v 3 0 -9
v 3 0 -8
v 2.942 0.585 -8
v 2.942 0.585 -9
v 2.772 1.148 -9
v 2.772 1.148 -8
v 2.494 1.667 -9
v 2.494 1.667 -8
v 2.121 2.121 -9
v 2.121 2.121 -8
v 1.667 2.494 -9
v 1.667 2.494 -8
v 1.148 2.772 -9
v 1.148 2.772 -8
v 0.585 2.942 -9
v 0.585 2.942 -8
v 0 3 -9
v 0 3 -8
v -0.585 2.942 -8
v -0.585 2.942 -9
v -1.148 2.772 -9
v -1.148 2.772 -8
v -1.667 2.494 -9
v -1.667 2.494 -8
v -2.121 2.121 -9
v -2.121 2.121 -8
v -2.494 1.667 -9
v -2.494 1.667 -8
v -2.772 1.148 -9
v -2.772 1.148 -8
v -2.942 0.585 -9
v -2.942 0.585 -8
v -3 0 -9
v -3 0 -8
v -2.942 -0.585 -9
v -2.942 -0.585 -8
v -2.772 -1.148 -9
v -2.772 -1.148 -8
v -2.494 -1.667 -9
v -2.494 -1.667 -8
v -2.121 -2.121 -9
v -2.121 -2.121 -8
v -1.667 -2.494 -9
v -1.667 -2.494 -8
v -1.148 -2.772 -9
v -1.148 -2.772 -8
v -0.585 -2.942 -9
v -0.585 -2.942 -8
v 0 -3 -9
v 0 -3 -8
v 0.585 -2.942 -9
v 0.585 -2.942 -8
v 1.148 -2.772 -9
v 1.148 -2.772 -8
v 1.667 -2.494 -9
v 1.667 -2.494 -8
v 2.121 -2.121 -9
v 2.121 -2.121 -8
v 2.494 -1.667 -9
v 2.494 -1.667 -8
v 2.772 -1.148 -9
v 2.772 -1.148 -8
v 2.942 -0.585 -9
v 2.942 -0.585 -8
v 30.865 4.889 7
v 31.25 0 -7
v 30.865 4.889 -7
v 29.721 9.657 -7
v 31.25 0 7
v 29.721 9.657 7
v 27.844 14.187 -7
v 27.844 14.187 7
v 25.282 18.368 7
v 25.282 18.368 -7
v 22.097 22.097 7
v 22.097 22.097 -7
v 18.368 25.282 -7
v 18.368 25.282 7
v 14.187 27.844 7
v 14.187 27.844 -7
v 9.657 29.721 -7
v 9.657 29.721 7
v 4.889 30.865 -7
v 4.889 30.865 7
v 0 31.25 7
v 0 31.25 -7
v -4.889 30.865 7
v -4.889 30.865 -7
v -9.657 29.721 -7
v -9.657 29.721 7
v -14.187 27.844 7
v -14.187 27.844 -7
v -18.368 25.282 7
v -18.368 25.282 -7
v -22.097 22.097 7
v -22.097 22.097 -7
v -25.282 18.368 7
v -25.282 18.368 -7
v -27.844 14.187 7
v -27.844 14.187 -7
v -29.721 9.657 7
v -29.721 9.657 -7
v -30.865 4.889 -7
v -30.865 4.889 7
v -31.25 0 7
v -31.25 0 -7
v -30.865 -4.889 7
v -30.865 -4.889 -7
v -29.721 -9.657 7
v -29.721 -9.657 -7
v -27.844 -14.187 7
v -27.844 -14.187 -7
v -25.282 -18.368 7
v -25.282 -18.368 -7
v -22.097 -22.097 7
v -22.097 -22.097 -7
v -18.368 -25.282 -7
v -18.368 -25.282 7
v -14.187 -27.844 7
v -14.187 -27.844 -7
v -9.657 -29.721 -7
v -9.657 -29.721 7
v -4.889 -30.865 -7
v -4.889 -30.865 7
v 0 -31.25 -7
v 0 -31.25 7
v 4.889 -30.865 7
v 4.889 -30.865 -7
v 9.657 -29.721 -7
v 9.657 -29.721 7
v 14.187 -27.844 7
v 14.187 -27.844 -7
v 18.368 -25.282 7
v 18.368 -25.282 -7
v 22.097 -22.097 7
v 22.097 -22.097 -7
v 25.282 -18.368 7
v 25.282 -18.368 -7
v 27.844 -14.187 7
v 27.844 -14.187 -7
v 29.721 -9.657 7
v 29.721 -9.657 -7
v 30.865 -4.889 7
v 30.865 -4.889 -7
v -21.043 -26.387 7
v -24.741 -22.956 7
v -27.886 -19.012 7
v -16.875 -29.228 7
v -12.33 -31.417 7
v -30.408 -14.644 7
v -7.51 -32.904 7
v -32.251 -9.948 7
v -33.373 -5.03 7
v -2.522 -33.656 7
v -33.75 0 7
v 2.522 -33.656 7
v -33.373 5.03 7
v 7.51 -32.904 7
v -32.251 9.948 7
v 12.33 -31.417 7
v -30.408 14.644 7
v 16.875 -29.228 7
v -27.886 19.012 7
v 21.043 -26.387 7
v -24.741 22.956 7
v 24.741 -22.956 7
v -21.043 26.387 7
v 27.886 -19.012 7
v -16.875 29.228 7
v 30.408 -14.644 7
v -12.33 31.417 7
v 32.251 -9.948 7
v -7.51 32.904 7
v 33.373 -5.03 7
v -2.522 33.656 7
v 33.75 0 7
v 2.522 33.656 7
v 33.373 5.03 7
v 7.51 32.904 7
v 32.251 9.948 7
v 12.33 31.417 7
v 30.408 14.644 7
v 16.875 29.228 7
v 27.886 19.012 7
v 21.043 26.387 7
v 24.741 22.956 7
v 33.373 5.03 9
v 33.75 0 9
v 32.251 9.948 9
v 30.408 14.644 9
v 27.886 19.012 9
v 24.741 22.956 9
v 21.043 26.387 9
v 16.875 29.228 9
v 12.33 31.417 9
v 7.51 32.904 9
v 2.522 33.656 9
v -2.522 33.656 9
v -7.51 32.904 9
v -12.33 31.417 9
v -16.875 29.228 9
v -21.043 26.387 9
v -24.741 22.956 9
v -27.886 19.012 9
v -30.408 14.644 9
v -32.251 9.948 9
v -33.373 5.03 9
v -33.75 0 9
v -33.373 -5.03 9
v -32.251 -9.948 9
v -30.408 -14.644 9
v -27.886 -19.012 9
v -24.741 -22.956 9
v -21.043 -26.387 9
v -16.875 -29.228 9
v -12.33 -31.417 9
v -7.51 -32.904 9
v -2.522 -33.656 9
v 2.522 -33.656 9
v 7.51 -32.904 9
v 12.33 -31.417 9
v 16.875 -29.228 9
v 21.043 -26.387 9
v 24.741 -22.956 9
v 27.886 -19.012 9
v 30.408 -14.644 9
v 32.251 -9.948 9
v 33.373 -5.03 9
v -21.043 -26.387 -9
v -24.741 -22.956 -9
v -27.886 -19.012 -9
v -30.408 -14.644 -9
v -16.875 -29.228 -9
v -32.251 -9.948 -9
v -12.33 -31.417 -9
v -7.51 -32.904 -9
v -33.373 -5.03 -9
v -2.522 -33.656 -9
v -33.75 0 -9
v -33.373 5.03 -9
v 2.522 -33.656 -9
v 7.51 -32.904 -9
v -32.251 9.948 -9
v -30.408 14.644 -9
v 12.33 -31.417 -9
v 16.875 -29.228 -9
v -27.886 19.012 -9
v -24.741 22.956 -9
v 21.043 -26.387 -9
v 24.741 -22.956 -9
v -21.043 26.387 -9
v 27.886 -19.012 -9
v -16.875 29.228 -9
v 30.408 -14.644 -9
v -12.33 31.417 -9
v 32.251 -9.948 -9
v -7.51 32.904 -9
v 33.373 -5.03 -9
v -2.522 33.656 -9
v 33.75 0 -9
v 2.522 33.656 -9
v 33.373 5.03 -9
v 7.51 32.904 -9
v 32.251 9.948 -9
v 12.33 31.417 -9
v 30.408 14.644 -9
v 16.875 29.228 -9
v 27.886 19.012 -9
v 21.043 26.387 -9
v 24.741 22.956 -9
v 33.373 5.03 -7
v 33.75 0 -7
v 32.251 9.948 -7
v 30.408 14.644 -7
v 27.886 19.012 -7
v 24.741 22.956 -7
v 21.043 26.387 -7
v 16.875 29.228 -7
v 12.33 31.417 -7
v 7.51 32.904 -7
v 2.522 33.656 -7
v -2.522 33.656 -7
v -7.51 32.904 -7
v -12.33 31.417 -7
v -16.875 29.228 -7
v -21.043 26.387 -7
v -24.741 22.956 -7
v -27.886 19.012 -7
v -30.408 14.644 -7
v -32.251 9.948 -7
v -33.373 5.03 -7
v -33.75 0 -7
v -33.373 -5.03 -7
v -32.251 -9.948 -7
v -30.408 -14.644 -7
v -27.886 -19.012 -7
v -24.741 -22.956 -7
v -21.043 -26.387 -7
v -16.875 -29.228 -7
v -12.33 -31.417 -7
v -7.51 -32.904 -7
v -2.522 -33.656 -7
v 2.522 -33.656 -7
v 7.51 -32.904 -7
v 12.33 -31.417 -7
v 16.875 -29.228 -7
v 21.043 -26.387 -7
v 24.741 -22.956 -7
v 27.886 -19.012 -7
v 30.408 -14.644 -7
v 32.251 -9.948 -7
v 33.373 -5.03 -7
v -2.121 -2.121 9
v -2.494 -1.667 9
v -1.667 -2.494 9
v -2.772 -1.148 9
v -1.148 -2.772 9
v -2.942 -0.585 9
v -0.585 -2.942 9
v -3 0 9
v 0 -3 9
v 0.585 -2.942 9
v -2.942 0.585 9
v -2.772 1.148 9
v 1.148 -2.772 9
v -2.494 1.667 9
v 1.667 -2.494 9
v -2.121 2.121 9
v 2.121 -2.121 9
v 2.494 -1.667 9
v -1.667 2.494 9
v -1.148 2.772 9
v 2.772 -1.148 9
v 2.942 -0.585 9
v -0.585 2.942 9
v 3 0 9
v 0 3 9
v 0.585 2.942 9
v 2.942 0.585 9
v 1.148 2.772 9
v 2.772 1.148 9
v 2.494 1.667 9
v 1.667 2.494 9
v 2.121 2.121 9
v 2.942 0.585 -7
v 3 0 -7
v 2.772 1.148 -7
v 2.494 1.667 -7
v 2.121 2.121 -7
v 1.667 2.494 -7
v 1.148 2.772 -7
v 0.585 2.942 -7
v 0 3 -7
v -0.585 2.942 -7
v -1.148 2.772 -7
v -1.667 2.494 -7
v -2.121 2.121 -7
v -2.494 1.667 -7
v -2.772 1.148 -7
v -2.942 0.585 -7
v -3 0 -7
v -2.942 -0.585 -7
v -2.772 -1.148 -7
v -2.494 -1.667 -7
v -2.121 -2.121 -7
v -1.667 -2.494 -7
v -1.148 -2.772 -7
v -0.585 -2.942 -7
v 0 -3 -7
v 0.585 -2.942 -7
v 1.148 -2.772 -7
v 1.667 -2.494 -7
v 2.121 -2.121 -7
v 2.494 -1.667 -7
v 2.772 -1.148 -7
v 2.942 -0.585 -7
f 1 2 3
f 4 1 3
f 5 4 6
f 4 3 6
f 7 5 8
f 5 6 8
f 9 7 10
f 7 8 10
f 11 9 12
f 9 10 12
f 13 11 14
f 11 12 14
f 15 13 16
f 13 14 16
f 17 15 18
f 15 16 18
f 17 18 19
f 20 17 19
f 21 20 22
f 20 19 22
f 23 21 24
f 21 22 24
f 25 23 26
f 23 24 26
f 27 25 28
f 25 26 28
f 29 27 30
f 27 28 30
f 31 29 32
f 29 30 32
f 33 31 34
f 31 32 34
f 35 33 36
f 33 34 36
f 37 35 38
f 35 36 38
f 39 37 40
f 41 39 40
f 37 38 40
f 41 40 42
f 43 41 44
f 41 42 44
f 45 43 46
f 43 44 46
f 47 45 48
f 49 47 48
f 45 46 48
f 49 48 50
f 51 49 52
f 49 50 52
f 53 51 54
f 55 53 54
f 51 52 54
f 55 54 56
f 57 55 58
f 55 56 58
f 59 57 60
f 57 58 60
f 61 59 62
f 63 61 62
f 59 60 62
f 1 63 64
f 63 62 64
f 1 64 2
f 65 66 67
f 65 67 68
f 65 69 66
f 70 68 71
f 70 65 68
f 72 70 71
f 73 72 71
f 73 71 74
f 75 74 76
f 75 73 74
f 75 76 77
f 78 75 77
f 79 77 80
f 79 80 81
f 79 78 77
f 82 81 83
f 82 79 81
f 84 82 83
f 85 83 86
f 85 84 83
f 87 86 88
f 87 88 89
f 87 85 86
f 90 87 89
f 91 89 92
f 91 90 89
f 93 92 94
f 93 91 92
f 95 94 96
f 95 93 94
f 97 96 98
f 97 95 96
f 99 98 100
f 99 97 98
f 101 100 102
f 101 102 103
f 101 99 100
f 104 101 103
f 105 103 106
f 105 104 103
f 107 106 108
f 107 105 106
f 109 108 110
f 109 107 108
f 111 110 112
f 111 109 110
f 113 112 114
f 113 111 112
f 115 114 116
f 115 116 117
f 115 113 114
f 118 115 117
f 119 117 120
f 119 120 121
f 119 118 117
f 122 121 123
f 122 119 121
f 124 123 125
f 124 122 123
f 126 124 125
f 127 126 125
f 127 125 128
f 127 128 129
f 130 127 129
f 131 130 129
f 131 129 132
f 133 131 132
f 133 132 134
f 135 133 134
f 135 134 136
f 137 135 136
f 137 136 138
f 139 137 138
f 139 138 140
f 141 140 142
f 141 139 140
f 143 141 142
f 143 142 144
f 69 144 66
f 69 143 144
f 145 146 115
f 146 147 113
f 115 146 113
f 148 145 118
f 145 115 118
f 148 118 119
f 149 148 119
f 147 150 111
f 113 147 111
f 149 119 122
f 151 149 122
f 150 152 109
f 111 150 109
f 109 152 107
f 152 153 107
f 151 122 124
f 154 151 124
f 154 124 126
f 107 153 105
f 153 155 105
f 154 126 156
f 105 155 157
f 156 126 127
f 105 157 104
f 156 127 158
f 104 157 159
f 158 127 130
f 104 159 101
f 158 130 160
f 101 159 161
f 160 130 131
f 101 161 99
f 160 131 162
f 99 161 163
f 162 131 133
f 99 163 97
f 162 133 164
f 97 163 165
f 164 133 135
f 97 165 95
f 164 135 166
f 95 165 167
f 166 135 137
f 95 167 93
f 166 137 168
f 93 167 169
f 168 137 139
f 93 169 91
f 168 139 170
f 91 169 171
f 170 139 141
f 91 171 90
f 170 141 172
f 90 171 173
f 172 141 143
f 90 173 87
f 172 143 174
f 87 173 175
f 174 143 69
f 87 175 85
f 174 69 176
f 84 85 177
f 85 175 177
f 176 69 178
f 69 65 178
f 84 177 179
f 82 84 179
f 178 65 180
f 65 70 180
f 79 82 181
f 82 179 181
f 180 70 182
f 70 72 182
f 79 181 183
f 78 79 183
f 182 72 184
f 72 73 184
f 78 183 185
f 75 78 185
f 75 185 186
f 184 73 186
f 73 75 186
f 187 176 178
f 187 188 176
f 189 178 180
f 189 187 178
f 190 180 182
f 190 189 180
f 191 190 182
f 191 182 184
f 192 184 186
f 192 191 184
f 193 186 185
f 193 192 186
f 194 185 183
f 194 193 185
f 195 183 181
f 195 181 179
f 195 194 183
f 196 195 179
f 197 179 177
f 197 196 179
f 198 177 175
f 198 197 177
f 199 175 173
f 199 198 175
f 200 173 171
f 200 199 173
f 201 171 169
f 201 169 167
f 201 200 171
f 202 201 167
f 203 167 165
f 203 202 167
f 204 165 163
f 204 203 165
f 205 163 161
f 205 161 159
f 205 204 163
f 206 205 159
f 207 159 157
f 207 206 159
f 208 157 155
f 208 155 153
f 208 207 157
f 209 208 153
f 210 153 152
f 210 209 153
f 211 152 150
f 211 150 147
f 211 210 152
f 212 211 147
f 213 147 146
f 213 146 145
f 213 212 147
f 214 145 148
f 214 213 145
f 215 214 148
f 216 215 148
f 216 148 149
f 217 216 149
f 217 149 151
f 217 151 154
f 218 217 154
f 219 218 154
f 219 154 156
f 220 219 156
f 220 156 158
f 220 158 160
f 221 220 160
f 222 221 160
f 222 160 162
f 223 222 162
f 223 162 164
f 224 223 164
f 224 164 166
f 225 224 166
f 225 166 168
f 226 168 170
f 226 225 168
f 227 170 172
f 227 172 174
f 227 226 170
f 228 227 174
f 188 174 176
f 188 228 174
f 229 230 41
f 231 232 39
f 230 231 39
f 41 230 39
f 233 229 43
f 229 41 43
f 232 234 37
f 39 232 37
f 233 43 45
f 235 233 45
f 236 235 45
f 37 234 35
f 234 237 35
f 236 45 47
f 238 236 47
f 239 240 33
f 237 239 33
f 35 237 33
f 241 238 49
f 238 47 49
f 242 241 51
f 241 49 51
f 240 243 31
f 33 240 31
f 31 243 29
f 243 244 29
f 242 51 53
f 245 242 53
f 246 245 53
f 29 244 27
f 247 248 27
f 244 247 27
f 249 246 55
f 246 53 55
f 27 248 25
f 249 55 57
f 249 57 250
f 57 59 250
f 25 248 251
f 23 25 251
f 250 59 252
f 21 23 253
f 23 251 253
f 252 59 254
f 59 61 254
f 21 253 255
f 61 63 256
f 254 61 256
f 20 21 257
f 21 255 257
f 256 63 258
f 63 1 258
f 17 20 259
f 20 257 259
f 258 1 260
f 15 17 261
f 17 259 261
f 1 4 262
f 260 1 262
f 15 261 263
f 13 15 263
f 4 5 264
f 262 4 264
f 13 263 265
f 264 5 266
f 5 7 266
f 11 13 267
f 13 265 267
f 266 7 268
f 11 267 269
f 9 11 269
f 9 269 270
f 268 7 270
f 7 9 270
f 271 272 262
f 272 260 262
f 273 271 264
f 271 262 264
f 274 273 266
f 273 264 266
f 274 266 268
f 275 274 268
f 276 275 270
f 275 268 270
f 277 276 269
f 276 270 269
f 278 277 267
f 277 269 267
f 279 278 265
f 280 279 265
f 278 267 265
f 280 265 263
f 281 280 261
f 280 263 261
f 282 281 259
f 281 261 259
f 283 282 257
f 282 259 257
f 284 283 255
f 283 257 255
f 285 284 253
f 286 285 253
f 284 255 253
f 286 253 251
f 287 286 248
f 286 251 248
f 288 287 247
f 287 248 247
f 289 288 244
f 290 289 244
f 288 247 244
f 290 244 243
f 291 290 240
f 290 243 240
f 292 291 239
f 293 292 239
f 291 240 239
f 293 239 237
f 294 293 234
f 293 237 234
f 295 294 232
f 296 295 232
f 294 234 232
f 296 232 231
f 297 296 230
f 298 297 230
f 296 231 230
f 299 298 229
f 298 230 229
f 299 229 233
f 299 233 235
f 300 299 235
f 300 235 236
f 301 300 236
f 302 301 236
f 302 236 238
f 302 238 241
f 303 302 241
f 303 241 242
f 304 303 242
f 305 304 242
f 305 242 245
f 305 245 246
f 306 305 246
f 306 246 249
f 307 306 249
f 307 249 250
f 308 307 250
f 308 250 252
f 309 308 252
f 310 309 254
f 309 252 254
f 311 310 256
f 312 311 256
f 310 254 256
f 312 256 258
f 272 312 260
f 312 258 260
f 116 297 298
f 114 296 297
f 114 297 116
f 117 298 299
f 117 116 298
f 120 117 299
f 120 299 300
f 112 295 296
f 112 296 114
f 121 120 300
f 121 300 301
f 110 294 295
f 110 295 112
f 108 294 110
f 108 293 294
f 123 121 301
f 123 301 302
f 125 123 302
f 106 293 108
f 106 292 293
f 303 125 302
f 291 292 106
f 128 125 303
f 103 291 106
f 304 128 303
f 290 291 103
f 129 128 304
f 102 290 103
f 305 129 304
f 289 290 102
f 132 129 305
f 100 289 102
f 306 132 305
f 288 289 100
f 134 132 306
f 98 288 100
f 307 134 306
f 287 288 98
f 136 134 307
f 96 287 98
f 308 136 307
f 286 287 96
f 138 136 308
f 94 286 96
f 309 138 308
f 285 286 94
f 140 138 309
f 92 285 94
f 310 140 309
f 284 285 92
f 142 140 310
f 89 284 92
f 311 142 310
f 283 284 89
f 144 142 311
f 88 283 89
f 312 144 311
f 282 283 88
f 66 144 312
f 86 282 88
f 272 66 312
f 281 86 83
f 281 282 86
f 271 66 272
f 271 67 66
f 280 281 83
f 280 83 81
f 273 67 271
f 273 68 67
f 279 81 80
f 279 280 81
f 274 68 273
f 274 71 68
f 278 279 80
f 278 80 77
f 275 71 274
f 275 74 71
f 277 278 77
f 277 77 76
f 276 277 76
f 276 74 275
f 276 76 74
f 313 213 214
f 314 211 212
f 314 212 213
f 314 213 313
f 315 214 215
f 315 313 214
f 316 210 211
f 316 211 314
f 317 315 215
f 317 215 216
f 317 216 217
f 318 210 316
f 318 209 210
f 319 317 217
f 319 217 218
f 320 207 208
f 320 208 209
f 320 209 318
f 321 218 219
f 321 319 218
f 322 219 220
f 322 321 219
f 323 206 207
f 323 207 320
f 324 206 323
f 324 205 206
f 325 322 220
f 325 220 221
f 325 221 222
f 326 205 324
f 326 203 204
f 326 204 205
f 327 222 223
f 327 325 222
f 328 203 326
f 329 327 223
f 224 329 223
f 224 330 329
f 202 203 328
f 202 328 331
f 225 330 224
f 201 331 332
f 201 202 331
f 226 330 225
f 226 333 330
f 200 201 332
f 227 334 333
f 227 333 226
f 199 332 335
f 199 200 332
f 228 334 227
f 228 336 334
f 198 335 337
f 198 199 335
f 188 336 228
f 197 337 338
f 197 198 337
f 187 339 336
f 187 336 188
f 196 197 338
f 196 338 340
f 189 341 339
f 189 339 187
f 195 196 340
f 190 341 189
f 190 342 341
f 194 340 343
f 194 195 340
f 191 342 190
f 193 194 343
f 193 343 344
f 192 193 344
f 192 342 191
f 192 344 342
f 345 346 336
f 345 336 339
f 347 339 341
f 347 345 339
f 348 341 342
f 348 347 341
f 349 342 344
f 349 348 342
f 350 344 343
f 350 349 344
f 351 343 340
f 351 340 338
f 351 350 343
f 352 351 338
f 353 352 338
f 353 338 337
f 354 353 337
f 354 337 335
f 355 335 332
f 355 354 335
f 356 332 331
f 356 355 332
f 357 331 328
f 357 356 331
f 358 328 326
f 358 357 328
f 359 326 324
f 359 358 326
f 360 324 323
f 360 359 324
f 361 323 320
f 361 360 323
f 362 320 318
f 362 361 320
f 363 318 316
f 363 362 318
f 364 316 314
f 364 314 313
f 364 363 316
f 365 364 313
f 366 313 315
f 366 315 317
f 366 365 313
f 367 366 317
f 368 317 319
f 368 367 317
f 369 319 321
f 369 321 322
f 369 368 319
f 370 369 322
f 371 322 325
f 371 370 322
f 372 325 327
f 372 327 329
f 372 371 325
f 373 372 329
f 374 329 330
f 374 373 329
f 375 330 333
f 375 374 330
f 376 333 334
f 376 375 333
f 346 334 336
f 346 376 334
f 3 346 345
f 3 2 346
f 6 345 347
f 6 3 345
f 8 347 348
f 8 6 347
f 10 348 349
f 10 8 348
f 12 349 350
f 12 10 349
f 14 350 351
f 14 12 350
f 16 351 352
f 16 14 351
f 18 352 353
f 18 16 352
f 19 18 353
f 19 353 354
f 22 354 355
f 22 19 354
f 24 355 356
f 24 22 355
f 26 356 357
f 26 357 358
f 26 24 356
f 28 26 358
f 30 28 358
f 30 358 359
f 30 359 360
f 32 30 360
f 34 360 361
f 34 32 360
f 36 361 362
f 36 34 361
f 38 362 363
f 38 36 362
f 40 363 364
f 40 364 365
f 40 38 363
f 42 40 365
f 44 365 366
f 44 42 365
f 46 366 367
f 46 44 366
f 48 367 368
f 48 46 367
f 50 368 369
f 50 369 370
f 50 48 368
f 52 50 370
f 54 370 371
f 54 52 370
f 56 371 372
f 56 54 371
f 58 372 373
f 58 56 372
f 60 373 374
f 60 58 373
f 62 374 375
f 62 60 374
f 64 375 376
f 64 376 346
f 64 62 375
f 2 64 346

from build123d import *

# Parameters (mm, degrees)
SKETCH1_R           = 31.25
SKETCH1_R_2         = 3
BOSS_EXTRUDE1_DEPTH = 8
SKETCH2_R           = 33.75
SKETCH2_R_2         = 3
BOSS_EXTRUDE2_DEPTH = 1


with BuildPart() as part:
    # Sketch1 → Boss-Extrude1 (new, symmetric)
    with BuildSketch(Plane.XY):
        Circle(SKETCH1_R)
        Circle(SKETCH1_R_2, mode=Mode.SUBTRACT)
    extrude(amount=BOSS_EXTRUDE1_DEPTH, both=True)

    # Sketch2 → Boss-Extrude2 (add, symmetric)
    with BuildSketch(Plane.XY.offset(8)):
        Circle(SKETCH2_R)
        Circle(SKETCH2_R_2, mode=Mode.SUBTRACT)
    boss_extrude2 = extrude(amount=BOSS_EXTRUDE2_DEPTH, both=True)

    # Mirror1: Boss-Extrude2 across plane
    add(boss_extrude2.mirror(Plane.XY))


solid = part.part
